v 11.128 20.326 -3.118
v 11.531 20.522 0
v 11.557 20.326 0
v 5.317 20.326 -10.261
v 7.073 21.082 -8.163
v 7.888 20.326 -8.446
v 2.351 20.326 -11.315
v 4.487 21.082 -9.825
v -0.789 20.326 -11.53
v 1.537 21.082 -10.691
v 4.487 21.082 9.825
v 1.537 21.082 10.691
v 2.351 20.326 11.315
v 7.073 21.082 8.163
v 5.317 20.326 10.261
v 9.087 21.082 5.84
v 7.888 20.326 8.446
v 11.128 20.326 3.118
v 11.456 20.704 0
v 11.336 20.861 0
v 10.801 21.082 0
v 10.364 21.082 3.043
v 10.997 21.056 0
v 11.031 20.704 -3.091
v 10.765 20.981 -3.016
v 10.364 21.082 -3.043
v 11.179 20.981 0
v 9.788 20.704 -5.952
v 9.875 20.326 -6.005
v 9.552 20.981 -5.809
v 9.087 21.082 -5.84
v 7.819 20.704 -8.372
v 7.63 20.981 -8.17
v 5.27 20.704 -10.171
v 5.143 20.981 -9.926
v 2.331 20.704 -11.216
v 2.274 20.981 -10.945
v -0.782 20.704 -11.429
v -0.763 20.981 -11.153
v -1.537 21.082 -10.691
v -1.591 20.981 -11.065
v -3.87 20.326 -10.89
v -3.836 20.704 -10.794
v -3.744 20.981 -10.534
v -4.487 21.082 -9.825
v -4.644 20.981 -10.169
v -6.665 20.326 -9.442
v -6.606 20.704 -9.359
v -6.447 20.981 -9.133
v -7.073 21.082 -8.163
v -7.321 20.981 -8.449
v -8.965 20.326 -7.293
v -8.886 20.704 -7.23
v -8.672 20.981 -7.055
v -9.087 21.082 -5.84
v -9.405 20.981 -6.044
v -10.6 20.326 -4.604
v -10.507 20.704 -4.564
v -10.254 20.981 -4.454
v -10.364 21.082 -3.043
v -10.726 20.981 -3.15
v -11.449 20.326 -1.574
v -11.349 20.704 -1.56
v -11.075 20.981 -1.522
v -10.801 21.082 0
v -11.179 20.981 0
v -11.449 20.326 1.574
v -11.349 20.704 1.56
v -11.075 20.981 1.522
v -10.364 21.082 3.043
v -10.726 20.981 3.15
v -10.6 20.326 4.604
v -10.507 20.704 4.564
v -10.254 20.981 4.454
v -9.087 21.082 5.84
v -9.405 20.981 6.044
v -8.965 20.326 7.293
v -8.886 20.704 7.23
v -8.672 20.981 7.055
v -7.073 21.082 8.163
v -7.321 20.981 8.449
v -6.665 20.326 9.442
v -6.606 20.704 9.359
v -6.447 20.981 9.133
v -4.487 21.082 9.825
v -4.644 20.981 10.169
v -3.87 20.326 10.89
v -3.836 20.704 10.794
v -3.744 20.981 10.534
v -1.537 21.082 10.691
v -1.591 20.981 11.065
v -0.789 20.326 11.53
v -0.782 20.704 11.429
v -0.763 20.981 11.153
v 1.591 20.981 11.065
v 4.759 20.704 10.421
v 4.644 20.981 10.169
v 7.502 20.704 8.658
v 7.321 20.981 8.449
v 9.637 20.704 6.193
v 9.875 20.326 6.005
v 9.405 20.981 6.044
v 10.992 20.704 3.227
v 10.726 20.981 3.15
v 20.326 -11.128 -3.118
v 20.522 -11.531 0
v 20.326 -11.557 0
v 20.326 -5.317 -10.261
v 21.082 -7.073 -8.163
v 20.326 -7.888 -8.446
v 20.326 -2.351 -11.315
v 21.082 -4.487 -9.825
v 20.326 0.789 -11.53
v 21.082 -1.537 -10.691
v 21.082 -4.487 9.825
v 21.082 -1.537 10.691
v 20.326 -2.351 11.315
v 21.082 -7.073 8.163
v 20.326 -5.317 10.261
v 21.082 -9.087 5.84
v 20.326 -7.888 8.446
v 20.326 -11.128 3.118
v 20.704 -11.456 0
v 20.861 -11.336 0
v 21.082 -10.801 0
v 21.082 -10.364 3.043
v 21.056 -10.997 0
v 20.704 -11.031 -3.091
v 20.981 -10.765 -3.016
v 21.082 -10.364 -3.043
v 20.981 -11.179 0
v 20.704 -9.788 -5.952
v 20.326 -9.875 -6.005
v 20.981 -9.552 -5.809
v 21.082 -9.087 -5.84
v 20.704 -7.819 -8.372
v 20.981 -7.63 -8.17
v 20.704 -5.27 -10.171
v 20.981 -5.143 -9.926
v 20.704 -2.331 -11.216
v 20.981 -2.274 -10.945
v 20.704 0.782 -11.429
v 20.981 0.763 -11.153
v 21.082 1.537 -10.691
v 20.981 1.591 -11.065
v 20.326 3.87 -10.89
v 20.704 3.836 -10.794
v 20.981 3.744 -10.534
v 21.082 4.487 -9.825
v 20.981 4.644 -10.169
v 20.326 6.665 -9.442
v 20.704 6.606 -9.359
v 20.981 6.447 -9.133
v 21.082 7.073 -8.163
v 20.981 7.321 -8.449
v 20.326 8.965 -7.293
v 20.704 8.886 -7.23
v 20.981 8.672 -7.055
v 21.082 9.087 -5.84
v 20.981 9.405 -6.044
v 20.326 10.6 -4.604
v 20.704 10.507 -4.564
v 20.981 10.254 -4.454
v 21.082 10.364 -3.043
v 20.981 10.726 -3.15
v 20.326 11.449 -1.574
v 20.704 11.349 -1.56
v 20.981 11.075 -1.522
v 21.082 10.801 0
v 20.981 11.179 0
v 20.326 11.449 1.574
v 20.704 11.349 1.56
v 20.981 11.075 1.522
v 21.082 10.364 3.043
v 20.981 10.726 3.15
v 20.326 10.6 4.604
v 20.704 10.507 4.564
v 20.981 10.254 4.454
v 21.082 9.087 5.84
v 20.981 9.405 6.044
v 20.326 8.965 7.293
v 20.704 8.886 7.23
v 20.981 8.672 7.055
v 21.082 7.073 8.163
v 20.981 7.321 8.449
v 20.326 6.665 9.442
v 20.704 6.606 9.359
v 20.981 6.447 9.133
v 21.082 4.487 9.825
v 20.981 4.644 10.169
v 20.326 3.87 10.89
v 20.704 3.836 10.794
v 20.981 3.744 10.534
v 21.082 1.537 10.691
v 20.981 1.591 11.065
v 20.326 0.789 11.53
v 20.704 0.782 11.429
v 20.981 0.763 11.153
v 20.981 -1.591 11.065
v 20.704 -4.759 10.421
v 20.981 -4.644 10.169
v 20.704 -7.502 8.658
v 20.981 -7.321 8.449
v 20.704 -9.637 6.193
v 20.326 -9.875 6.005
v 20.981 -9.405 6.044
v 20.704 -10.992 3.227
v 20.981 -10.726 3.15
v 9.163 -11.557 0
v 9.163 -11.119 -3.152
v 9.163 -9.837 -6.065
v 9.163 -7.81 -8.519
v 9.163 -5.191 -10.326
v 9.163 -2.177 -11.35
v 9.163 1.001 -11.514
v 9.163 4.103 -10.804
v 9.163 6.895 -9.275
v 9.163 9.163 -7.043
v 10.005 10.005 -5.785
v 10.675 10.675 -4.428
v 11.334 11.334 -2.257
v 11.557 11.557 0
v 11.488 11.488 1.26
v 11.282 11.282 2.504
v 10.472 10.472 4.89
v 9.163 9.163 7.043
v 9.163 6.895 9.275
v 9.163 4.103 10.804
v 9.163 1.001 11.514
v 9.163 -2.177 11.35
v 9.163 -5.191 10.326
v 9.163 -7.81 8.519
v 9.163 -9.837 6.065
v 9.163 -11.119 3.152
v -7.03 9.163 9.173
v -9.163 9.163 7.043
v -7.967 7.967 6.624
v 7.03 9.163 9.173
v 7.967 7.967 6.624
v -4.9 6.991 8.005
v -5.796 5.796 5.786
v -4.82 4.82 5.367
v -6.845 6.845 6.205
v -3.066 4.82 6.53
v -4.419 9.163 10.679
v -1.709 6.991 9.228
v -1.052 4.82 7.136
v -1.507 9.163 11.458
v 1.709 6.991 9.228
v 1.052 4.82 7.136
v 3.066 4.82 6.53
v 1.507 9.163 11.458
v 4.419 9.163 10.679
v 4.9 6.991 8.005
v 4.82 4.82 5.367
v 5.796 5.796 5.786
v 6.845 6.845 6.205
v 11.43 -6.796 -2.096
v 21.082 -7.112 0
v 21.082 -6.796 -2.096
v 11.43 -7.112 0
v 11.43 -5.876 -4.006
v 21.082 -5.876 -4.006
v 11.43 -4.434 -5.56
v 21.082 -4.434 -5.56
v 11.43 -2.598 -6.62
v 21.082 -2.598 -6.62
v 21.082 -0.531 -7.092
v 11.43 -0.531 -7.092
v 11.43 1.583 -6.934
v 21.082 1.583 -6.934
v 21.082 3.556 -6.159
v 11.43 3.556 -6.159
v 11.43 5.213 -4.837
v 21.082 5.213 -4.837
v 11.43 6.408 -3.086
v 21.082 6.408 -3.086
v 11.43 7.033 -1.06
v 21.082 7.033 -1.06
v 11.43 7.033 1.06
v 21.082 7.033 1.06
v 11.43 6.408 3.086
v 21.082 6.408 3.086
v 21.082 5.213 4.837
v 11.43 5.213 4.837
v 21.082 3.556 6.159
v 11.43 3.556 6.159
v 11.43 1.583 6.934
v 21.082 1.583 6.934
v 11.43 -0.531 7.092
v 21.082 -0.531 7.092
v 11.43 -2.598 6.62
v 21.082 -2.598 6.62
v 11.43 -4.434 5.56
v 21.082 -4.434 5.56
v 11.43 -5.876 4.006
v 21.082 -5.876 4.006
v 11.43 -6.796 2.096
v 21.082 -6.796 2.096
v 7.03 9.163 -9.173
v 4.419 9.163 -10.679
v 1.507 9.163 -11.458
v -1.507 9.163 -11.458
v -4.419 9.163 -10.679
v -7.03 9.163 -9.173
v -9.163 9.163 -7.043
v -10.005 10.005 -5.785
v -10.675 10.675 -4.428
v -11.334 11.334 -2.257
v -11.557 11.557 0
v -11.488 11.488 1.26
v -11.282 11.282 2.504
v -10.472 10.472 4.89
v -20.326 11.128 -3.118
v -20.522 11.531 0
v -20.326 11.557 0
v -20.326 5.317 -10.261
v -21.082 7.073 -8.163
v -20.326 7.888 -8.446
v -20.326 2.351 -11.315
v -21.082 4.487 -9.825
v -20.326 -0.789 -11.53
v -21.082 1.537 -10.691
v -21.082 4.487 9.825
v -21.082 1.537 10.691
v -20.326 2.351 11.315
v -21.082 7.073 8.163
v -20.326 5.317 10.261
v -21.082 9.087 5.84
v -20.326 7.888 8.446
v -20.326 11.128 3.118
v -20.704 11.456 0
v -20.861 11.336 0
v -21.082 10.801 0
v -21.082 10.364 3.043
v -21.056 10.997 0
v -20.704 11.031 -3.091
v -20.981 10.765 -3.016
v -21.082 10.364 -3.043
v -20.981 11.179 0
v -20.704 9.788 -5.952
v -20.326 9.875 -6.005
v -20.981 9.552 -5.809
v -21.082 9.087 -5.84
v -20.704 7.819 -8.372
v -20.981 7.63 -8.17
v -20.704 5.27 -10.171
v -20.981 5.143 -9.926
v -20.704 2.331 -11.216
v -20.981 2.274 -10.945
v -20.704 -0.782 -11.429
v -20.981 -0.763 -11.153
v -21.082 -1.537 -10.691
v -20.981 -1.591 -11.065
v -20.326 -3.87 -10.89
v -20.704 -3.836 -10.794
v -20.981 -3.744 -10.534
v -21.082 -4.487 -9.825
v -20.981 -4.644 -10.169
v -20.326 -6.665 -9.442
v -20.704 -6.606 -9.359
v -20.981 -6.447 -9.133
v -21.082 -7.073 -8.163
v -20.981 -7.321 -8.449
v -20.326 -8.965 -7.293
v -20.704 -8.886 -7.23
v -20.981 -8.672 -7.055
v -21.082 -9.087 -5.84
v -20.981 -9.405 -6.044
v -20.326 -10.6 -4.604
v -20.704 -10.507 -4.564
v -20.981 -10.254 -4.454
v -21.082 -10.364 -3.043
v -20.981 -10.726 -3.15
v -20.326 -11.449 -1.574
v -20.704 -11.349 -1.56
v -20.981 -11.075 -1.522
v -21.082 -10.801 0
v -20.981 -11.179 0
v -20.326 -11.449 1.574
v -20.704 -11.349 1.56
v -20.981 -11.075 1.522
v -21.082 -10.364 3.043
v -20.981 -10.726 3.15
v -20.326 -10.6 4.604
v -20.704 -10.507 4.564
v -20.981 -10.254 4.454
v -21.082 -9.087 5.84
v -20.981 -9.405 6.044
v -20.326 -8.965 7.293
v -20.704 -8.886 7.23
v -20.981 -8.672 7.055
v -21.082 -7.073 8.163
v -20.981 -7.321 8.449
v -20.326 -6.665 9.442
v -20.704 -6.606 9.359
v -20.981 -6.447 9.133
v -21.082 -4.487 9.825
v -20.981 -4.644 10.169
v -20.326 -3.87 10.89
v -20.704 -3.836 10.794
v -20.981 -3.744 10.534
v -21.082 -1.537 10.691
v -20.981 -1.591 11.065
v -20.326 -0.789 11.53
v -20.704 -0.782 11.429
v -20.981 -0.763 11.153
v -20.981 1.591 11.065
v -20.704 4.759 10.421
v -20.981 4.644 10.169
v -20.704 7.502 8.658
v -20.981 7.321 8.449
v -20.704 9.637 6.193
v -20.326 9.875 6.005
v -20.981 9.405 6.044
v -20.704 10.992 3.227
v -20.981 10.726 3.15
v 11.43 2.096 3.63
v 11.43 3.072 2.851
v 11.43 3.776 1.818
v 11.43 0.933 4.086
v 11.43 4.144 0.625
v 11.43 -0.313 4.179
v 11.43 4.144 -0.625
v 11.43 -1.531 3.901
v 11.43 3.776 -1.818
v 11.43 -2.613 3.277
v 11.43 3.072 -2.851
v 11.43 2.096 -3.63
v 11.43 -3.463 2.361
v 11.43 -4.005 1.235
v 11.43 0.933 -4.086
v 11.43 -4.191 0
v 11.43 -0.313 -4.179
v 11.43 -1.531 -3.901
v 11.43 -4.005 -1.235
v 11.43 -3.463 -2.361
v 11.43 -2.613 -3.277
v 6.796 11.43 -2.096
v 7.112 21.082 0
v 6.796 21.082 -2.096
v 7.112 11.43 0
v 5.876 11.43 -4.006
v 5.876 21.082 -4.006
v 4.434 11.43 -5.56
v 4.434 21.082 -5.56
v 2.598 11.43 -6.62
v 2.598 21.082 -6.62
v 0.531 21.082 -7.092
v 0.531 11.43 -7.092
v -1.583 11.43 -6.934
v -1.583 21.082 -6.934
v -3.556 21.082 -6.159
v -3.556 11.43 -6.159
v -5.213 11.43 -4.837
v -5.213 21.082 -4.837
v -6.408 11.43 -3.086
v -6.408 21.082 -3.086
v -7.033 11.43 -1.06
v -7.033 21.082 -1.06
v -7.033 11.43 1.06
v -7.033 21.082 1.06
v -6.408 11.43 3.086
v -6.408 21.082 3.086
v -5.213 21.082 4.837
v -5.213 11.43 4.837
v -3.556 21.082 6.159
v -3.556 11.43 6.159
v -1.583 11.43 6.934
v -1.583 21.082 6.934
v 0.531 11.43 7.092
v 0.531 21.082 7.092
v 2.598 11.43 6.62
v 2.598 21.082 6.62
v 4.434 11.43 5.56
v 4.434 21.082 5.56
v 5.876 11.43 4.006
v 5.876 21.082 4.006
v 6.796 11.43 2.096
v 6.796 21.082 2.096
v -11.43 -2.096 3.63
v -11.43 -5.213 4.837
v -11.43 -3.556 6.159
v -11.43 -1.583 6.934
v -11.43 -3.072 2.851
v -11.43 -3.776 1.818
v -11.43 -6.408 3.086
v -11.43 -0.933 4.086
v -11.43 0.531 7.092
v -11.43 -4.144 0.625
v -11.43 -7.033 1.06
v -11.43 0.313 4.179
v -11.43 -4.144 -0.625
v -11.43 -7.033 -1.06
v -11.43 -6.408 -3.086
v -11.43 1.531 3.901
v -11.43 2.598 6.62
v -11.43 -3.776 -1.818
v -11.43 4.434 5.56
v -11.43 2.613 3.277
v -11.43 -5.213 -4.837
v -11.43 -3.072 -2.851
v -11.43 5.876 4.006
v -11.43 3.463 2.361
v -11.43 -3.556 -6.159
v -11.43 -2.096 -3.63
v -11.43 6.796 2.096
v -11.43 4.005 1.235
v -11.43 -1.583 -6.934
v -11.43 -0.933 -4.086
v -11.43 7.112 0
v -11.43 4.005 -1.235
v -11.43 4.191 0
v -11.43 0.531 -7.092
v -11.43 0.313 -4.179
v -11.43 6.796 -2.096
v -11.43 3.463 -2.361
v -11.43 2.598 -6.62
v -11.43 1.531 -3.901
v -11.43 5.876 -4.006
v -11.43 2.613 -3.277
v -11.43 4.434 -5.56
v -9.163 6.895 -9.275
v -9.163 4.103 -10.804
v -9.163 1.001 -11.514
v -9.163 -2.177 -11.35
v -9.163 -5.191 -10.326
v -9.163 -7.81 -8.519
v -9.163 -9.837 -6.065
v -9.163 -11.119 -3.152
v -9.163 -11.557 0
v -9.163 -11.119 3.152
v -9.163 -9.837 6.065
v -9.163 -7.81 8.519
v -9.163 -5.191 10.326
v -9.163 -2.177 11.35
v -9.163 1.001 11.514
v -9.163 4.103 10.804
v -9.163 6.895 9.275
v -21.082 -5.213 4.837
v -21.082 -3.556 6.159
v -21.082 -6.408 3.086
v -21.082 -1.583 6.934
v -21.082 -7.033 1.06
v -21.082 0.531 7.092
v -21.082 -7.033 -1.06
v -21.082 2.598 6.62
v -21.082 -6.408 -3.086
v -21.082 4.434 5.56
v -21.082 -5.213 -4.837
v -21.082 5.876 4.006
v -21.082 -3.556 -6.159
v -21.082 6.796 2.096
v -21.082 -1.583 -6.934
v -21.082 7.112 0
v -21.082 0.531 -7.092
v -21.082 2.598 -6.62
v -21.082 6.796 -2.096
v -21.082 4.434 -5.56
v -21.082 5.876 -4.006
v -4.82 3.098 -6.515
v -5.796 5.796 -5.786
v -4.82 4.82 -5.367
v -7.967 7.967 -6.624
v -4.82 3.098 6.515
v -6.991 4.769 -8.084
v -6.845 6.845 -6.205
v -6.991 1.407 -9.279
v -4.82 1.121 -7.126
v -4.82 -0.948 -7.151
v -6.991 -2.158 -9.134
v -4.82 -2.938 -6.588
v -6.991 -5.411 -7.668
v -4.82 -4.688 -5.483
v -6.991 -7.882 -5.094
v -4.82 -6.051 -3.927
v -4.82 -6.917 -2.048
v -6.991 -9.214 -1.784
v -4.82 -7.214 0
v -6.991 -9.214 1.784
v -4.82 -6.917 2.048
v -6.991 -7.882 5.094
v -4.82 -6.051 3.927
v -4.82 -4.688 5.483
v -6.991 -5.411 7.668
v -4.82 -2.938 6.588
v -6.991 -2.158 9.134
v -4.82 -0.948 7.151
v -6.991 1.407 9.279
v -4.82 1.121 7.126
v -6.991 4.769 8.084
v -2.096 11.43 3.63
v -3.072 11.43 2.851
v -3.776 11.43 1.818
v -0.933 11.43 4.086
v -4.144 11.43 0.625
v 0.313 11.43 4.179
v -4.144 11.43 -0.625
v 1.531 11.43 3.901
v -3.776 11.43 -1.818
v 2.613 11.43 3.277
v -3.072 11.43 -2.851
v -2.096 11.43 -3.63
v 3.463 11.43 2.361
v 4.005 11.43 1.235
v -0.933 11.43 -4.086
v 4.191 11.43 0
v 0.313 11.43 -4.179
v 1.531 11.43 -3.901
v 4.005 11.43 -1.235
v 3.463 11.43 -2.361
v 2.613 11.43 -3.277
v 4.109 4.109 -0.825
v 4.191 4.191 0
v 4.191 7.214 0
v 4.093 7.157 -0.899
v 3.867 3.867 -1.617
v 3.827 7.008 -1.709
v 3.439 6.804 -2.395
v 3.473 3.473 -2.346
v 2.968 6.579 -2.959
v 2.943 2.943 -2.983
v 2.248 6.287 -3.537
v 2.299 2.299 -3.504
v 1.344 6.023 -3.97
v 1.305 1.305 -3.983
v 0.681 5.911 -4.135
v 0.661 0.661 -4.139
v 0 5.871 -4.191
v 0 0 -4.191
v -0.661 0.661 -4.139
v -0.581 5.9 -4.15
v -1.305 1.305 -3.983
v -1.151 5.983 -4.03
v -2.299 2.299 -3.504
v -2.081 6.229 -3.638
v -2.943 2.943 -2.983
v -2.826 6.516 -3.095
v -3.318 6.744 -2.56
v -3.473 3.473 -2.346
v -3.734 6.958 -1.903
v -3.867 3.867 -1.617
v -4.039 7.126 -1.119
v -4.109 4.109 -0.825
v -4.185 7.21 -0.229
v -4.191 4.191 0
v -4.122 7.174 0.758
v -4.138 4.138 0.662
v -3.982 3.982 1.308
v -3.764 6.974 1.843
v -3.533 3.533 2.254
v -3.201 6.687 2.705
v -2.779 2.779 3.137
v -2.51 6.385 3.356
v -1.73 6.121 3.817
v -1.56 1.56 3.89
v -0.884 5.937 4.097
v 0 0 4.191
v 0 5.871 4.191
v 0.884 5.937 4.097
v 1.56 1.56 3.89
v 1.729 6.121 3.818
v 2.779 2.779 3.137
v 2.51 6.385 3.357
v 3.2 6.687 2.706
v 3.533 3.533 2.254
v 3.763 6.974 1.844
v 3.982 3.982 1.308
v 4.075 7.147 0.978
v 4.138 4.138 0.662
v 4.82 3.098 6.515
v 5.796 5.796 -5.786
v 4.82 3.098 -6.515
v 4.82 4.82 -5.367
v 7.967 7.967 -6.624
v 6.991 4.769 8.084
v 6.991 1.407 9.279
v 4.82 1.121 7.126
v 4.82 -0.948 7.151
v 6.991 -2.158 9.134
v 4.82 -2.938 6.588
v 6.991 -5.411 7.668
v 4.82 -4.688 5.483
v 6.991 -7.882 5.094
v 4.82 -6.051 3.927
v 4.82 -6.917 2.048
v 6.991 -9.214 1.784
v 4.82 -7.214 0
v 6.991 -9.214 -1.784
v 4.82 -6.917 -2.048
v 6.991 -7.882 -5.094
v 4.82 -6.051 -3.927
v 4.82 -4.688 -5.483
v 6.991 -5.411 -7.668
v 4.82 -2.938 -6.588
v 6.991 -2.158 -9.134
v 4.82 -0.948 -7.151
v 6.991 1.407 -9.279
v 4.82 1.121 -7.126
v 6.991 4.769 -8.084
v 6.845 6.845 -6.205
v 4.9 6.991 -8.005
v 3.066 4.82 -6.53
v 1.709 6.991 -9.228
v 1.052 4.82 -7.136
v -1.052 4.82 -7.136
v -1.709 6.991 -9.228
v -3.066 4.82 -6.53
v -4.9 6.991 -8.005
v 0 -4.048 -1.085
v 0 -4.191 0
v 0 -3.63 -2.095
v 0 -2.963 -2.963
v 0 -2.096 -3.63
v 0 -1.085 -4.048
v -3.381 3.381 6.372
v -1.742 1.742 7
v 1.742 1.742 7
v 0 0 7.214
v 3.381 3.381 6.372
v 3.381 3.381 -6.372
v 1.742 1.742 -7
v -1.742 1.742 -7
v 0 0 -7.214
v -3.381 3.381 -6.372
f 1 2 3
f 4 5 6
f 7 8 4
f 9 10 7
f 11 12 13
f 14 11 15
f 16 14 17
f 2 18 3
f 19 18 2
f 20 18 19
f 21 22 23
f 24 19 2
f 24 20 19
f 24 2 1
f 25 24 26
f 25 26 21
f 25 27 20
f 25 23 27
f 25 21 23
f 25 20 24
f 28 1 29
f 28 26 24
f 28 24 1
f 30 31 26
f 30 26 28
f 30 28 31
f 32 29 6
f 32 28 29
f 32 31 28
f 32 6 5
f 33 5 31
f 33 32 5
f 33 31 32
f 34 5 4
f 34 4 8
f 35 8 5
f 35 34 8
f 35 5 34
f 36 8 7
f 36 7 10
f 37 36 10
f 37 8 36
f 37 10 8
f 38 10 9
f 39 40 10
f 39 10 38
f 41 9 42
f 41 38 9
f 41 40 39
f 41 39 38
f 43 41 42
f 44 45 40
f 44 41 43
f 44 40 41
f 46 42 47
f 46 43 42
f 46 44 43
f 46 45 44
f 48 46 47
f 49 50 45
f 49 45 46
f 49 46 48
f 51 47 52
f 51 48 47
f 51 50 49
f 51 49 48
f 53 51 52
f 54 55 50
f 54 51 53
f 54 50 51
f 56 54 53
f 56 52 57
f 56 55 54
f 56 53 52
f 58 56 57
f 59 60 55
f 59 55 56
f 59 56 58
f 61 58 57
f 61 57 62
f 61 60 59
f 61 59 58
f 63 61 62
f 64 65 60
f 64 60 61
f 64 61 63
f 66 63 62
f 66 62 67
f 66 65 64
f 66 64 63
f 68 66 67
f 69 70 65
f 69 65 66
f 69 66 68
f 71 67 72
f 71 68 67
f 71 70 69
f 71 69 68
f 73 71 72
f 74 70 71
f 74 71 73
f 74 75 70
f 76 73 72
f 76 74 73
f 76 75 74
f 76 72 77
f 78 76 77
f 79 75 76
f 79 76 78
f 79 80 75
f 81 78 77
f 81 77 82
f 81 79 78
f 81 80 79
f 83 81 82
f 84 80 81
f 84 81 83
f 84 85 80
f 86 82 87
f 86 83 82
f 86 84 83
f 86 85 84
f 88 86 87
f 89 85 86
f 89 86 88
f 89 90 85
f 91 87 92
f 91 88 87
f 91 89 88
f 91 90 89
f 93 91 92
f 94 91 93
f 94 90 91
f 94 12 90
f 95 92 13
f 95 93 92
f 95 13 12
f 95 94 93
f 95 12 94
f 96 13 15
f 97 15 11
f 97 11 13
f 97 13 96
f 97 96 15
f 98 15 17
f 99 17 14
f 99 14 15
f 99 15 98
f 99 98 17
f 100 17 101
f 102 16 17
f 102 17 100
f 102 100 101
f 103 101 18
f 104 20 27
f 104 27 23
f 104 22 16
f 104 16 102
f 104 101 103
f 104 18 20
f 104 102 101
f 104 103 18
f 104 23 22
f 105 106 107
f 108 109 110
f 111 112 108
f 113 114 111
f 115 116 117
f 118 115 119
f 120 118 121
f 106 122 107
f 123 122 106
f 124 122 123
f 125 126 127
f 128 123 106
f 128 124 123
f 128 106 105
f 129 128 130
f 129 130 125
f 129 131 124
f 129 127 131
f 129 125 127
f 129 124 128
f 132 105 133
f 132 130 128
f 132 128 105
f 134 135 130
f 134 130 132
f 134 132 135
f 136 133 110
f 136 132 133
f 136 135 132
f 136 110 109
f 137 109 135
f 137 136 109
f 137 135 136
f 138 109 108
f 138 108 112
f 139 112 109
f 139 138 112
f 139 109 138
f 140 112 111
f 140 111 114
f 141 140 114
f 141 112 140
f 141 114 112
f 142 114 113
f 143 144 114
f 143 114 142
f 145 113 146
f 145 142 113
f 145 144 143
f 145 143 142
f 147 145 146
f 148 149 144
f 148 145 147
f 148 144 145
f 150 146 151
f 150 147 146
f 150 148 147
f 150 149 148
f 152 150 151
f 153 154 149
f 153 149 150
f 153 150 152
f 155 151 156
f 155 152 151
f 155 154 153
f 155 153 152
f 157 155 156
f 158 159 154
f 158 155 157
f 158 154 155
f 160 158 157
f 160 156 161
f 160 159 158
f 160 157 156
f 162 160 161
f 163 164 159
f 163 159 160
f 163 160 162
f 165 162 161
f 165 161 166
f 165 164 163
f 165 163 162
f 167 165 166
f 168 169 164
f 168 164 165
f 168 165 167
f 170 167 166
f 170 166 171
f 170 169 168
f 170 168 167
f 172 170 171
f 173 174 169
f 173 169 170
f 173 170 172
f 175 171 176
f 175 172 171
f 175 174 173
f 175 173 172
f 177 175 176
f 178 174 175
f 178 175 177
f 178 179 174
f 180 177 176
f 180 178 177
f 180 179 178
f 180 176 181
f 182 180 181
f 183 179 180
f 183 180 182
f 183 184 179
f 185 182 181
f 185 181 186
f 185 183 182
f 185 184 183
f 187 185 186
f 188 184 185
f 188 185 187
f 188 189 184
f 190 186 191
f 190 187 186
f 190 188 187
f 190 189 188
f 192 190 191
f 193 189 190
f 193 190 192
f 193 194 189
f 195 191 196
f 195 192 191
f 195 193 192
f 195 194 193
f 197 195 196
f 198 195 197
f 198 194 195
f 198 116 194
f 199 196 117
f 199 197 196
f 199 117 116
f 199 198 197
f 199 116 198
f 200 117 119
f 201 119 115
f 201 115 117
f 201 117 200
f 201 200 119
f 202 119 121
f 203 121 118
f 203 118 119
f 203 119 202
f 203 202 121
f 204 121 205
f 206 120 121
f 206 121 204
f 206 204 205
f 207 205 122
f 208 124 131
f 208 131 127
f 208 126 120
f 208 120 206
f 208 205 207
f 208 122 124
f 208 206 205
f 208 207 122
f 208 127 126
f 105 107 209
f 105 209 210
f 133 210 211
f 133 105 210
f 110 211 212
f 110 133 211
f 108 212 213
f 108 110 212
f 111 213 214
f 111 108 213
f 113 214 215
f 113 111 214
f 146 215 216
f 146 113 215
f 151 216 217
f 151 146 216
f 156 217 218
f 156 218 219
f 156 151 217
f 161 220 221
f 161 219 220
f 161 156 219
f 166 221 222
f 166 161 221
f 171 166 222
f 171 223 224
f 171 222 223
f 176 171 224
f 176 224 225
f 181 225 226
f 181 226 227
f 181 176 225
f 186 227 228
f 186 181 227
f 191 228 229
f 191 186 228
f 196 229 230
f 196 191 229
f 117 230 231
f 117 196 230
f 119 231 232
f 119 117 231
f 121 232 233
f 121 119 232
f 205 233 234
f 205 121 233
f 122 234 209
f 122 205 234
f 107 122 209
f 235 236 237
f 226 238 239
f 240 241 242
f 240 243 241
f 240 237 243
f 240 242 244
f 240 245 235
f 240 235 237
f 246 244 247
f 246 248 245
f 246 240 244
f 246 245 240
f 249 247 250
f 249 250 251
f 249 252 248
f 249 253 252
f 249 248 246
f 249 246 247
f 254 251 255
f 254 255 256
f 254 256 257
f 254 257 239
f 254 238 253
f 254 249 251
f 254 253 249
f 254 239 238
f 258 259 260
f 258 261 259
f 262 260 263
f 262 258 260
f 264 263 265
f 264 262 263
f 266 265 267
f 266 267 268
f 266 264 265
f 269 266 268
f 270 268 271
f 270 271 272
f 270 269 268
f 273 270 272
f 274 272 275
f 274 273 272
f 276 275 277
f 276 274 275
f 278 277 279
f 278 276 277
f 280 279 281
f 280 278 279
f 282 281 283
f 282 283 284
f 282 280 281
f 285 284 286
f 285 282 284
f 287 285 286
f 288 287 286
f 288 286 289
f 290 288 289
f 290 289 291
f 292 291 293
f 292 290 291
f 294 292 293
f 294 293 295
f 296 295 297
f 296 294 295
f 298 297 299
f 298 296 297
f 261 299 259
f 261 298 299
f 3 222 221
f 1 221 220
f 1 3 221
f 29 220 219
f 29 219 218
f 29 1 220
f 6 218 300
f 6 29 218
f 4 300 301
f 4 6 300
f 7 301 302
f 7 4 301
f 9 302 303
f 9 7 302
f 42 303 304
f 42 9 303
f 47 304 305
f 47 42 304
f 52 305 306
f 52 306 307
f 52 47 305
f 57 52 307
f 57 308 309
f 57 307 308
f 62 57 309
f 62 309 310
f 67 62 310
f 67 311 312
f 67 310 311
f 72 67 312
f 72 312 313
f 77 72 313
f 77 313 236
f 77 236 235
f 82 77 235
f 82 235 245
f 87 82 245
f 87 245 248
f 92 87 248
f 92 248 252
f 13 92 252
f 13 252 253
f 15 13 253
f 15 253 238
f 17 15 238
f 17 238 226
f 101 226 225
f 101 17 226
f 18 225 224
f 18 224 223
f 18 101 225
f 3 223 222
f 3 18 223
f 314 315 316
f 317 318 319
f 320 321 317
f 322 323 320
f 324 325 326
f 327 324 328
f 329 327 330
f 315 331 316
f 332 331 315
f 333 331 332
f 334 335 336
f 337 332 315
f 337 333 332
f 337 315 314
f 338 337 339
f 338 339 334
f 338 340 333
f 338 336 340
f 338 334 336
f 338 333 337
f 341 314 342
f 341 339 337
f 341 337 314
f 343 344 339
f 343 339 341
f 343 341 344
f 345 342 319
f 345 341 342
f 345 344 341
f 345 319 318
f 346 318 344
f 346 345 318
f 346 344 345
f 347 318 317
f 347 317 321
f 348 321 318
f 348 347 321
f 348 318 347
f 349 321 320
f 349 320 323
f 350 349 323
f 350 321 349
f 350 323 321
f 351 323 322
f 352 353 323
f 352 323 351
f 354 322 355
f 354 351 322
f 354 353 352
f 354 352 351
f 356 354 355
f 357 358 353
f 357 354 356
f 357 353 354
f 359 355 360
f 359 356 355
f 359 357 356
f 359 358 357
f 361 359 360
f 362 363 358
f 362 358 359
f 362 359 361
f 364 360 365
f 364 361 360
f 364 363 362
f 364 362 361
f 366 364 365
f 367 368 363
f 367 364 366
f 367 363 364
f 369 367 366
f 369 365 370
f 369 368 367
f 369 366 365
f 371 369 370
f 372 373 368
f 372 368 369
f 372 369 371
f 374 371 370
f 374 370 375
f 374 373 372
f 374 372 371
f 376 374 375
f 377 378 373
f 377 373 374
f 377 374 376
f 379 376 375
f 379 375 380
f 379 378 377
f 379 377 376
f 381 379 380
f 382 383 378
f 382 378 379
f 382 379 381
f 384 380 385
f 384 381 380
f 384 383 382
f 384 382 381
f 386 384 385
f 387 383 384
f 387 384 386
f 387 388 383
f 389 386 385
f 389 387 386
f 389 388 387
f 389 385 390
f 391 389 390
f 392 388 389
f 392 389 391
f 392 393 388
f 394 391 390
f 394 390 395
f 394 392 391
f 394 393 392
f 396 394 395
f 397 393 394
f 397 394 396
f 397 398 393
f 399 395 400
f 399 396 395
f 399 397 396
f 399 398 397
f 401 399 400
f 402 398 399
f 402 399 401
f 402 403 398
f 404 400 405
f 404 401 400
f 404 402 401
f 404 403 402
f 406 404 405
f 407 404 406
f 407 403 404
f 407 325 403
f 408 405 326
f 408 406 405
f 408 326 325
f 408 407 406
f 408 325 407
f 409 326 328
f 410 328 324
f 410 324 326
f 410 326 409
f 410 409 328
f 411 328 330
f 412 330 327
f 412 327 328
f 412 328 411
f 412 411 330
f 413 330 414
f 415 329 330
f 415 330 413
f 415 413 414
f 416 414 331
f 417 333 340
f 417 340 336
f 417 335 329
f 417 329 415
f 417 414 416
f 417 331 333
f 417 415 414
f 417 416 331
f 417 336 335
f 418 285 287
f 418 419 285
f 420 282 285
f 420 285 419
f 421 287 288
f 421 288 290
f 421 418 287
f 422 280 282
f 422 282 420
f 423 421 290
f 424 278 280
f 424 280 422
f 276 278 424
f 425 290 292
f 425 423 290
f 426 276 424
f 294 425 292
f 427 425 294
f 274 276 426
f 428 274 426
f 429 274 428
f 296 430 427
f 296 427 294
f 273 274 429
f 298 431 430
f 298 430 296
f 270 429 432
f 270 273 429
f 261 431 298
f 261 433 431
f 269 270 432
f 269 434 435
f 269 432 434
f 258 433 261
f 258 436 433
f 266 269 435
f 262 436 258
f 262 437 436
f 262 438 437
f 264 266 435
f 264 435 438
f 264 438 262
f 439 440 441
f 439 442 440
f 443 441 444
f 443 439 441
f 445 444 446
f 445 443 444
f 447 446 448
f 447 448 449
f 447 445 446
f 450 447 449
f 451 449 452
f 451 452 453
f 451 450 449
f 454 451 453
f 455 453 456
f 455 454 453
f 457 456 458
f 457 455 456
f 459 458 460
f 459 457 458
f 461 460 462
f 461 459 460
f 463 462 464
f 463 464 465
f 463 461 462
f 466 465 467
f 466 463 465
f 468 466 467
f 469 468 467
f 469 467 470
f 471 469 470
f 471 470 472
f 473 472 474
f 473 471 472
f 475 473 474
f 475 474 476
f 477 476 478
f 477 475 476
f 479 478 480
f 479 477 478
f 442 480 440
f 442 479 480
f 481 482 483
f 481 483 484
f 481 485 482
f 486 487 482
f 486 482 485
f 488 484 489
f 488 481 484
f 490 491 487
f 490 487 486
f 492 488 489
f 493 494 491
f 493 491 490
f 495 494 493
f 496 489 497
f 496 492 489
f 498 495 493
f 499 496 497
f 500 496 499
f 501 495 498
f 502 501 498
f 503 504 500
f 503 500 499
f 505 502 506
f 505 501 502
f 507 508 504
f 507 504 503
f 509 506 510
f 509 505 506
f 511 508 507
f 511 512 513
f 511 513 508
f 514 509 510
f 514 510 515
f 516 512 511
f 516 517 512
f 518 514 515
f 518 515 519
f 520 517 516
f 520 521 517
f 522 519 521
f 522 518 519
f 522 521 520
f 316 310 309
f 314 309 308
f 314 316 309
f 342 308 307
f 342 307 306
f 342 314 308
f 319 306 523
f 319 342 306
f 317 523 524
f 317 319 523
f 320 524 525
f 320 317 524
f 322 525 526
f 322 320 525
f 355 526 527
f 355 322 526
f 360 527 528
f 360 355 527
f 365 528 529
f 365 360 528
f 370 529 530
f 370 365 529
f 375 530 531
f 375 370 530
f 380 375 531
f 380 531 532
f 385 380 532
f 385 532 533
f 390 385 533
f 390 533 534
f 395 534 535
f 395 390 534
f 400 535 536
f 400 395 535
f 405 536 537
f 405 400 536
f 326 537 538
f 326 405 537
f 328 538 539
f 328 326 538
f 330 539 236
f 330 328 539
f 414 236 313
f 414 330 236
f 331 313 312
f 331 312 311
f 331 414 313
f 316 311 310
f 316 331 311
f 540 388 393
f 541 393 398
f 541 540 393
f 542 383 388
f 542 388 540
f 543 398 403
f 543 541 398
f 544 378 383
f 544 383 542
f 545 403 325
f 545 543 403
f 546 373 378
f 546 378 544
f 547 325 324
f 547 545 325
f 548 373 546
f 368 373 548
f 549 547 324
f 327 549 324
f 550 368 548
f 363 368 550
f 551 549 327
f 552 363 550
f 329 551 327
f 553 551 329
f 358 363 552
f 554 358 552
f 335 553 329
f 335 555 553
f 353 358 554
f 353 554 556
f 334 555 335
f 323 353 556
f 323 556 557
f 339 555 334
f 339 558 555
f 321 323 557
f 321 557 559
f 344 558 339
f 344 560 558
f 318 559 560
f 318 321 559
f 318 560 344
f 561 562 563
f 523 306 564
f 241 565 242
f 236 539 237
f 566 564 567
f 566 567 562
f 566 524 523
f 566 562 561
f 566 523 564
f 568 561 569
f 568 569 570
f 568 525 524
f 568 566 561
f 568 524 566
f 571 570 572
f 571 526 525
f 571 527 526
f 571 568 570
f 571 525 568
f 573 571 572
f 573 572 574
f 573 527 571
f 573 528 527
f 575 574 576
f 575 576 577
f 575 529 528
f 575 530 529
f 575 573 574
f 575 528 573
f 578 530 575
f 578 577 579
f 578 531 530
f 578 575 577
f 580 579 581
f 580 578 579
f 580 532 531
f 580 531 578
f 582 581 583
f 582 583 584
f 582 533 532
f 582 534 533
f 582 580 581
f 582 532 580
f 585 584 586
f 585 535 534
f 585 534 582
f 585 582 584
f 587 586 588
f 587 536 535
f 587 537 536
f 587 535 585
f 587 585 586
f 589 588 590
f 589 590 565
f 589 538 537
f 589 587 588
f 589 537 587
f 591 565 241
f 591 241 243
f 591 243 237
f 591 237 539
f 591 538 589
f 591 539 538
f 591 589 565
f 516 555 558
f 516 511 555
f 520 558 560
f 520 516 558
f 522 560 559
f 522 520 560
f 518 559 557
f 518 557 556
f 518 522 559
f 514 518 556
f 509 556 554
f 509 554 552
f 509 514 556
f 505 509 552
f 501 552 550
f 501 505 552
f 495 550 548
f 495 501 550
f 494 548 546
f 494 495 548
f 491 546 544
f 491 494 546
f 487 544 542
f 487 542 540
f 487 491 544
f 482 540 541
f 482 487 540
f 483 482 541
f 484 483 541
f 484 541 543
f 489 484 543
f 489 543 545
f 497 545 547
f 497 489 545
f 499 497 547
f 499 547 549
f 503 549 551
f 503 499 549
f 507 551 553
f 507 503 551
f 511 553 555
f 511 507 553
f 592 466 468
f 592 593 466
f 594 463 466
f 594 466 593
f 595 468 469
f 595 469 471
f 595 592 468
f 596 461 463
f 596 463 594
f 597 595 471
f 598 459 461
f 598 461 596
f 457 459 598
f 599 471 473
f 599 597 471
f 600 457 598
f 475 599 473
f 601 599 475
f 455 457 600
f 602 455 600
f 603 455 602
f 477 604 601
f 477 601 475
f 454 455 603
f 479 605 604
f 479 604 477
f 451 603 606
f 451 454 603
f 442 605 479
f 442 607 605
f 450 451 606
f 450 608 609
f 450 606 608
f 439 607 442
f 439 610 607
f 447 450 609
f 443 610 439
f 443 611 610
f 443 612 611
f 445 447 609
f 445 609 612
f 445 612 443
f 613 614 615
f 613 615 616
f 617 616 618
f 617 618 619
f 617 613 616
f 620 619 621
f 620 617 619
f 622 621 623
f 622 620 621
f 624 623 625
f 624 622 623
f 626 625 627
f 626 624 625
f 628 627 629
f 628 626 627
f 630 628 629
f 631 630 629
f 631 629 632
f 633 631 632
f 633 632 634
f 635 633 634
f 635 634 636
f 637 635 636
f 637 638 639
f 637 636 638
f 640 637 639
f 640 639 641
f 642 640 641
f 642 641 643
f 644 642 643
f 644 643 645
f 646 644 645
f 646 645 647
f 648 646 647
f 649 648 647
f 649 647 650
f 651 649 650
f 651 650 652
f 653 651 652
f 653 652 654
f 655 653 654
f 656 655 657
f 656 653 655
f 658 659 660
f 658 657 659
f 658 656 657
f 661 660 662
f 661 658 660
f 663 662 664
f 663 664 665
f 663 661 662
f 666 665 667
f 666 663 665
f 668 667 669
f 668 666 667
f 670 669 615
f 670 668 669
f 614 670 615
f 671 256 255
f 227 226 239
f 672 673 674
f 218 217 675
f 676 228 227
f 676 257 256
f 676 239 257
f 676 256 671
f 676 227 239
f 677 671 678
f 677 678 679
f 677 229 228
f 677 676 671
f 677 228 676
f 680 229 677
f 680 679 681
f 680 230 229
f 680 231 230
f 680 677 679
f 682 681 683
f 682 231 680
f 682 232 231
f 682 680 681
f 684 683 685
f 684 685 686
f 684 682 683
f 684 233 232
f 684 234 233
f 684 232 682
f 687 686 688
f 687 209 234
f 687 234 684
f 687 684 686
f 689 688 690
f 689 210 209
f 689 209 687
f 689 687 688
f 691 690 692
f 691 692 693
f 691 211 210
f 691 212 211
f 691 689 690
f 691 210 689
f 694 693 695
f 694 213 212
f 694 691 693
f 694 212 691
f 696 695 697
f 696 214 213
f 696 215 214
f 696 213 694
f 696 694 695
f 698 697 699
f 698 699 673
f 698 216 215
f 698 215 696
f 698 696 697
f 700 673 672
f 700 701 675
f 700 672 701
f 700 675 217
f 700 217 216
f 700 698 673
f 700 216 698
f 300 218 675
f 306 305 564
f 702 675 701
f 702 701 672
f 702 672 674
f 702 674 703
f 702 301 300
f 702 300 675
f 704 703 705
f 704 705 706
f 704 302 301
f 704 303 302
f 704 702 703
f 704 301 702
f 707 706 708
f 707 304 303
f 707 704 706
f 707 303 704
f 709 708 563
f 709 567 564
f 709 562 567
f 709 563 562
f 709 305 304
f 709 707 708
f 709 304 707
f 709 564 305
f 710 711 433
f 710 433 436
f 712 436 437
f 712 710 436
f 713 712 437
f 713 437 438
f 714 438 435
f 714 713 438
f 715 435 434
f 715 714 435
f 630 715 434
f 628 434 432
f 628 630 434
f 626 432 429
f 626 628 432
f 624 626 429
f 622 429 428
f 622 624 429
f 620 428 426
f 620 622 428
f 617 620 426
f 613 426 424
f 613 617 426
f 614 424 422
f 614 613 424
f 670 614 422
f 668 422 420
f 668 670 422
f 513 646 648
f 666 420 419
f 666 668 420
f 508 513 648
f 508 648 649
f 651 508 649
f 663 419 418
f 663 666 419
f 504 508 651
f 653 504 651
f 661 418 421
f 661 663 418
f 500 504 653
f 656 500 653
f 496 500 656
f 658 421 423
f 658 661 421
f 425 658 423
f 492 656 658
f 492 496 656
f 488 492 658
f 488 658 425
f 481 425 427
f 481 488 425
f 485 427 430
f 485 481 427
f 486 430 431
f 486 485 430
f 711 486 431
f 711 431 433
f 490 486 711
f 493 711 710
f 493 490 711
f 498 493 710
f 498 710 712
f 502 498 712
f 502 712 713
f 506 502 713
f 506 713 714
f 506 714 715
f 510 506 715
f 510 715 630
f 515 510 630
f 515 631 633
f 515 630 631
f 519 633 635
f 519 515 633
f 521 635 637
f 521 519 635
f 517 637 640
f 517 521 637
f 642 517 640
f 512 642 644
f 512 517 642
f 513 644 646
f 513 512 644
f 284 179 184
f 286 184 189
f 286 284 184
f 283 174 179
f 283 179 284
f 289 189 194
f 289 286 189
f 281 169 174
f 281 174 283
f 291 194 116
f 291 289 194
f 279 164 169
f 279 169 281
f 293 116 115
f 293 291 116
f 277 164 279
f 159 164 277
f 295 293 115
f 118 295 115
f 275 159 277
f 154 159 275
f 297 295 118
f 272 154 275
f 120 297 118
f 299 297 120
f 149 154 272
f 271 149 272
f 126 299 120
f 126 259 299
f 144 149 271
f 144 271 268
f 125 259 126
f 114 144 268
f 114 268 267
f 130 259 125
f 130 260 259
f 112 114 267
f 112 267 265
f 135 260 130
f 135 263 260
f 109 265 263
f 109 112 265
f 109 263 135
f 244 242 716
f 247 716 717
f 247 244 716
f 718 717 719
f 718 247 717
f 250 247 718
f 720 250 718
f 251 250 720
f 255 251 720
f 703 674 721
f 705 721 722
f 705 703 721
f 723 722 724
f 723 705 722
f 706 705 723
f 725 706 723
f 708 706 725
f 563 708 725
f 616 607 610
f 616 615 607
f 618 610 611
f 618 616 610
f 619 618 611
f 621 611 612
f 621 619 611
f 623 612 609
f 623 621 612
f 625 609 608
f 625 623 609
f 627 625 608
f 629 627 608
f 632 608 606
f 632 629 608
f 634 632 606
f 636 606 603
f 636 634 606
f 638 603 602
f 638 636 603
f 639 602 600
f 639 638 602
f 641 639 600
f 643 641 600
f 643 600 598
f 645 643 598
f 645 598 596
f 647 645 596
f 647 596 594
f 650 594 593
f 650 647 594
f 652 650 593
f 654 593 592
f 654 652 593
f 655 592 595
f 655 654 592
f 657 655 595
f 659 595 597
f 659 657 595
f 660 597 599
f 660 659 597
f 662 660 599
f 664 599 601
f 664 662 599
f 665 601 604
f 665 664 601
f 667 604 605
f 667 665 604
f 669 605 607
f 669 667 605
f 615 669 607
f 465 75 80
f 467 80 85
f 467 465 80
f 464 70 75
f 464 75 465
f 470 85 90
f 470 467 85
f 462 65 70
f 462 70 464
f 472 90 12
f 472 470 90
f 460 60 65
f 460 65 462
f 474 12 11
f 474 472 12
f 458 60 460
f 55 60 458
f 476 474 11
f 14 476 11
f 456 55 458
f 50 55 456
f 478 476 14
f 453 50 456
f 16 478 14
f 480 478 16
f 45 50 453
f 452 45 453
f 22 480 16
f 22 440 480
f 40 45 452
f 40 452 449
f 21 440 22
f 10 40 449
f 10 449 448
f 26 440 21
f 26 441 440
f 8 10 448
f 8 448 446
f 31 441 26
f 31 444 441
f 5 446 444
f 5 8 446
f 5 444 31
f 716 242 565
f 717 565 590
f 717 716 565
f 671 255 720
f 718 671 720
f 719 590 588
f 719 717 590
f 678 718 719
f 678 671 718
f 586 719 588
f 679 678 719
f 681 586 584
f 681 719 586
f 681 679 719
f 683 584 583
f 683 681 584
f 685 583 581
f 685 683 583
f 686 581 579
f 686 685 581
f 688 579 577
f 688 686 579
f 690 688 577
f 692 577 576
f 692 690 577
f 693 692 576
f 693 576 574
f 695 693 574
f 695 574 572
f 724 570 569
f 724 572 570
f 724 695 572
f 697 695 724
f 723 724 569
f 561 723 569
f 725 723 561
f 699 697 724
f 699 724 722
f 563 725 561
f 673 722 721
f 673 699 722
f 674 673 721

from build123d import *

# Parameters (mm, degrees)
CIRPATTERN2_COUNT       = 3
CIRPATTERN2_ANGLE       = 180
SKETCH4_R               = 4.191
CUT_EXTRUDE1_DEPTH      = 32.976017529
CUT_EXTRUDE1_DEPTH_BACK = 32.976017529
SKETCH5_R               = 4.191
CUT_EXTRUDE2_DEPTH      = 32.976017529


with BuildPart() as part:
    # Sketch2 → Revolve1 (revolve)
    with BuildSketch(Plane.XY, mode=Mode.PRIVATE) as revolve1_sk:
        with BuildLine():
            Line((-21.082, -7.112), (-11.43, -7.112))
            Line((-11.43, -7.112), (-11.43, -4.191))
            Line((-11.43, -4.191), (0, -4.191))
            Line((0, -4.191), (0, -7.2136))
            Line((0, -7.2136), (-4.81965, -7.2136))
            Line((-4.81965, -7.2136), (-9.16305, -11.557))
            Line((-9.16305, -11.557), (-20.32635, -11.557))
            ThreePointArc((-20.32635, -11.557), (-20.860675239, -11.335675239), (-21.082, -10.80135))
            Line((-21.082, -10.80135), (-21.082, -7.112))
        make_face()
    revolve(revolve1_sk.sketch.rotate(Axis((0, 0, 0), (-1, 0, 0)), 180), axis=Axis((0, 0, 0), (-1, 0, 0)))


with BuildPart() as cirpattern2_1:
    # CirPattern2: pattern copy
    add(part.part.rotate(Axis((0, 0, 0), (0, 0, -1)), 1 * CIRPATTERN2_ANGLE / (CIRPATTERN2_COUNT - 1)))

    # Sketch4 → Cut-Extrude1 (cut, two sides)
    with BuildSketch(Plane(origin=(0, 0, 0), x_dir=(0, 0, -1), z_dir=(1, 0, 0))) as cut_extrude1_sk:
        with Locations(Location((0, 0, 0), (0, 0, 270))):
            Circle(SKETCH4_R)
    extrude(amount=CUT_EXTRUDE1_DEPTH, mode=Mode.SUBTRACT)
    extrude(cut_extrude1_sk.sketch, amount=-CUT_EXTRUDE1_DEPTH_BACK, mode=Mode.SUBTRACT)


with BuildPart() as cirpattern2_2:
    # CirPattern2: pattern copy
    add(part.part.rotate(Axis((0, 0, 0), (0, 0, -1)), 2 * CIRPATTERN2_ANGLE / (CIRPATTERN2_COUNT - 1)))


with BuildPart() as part_1:
    add(part.part)

    # Combine1: union CirPattern2_1, CirPattern2_2
    add(cirpattern2_1.part)
    add(cirpattern2_2.part)

    # Sketch5 → Cut-Extrude2 (cut, through all)
    with BuildSketch(Plane(origin=(0, 0, 0), x_dir=(1, 0, 0), z_dir=(0, 1, 0))):
        Circle(SKETCH5_R)
    extrude(amount=CUT_EXTRUDE2_DEPTH, mode=Mode.SUBTRACT)


solid = part_1.part
